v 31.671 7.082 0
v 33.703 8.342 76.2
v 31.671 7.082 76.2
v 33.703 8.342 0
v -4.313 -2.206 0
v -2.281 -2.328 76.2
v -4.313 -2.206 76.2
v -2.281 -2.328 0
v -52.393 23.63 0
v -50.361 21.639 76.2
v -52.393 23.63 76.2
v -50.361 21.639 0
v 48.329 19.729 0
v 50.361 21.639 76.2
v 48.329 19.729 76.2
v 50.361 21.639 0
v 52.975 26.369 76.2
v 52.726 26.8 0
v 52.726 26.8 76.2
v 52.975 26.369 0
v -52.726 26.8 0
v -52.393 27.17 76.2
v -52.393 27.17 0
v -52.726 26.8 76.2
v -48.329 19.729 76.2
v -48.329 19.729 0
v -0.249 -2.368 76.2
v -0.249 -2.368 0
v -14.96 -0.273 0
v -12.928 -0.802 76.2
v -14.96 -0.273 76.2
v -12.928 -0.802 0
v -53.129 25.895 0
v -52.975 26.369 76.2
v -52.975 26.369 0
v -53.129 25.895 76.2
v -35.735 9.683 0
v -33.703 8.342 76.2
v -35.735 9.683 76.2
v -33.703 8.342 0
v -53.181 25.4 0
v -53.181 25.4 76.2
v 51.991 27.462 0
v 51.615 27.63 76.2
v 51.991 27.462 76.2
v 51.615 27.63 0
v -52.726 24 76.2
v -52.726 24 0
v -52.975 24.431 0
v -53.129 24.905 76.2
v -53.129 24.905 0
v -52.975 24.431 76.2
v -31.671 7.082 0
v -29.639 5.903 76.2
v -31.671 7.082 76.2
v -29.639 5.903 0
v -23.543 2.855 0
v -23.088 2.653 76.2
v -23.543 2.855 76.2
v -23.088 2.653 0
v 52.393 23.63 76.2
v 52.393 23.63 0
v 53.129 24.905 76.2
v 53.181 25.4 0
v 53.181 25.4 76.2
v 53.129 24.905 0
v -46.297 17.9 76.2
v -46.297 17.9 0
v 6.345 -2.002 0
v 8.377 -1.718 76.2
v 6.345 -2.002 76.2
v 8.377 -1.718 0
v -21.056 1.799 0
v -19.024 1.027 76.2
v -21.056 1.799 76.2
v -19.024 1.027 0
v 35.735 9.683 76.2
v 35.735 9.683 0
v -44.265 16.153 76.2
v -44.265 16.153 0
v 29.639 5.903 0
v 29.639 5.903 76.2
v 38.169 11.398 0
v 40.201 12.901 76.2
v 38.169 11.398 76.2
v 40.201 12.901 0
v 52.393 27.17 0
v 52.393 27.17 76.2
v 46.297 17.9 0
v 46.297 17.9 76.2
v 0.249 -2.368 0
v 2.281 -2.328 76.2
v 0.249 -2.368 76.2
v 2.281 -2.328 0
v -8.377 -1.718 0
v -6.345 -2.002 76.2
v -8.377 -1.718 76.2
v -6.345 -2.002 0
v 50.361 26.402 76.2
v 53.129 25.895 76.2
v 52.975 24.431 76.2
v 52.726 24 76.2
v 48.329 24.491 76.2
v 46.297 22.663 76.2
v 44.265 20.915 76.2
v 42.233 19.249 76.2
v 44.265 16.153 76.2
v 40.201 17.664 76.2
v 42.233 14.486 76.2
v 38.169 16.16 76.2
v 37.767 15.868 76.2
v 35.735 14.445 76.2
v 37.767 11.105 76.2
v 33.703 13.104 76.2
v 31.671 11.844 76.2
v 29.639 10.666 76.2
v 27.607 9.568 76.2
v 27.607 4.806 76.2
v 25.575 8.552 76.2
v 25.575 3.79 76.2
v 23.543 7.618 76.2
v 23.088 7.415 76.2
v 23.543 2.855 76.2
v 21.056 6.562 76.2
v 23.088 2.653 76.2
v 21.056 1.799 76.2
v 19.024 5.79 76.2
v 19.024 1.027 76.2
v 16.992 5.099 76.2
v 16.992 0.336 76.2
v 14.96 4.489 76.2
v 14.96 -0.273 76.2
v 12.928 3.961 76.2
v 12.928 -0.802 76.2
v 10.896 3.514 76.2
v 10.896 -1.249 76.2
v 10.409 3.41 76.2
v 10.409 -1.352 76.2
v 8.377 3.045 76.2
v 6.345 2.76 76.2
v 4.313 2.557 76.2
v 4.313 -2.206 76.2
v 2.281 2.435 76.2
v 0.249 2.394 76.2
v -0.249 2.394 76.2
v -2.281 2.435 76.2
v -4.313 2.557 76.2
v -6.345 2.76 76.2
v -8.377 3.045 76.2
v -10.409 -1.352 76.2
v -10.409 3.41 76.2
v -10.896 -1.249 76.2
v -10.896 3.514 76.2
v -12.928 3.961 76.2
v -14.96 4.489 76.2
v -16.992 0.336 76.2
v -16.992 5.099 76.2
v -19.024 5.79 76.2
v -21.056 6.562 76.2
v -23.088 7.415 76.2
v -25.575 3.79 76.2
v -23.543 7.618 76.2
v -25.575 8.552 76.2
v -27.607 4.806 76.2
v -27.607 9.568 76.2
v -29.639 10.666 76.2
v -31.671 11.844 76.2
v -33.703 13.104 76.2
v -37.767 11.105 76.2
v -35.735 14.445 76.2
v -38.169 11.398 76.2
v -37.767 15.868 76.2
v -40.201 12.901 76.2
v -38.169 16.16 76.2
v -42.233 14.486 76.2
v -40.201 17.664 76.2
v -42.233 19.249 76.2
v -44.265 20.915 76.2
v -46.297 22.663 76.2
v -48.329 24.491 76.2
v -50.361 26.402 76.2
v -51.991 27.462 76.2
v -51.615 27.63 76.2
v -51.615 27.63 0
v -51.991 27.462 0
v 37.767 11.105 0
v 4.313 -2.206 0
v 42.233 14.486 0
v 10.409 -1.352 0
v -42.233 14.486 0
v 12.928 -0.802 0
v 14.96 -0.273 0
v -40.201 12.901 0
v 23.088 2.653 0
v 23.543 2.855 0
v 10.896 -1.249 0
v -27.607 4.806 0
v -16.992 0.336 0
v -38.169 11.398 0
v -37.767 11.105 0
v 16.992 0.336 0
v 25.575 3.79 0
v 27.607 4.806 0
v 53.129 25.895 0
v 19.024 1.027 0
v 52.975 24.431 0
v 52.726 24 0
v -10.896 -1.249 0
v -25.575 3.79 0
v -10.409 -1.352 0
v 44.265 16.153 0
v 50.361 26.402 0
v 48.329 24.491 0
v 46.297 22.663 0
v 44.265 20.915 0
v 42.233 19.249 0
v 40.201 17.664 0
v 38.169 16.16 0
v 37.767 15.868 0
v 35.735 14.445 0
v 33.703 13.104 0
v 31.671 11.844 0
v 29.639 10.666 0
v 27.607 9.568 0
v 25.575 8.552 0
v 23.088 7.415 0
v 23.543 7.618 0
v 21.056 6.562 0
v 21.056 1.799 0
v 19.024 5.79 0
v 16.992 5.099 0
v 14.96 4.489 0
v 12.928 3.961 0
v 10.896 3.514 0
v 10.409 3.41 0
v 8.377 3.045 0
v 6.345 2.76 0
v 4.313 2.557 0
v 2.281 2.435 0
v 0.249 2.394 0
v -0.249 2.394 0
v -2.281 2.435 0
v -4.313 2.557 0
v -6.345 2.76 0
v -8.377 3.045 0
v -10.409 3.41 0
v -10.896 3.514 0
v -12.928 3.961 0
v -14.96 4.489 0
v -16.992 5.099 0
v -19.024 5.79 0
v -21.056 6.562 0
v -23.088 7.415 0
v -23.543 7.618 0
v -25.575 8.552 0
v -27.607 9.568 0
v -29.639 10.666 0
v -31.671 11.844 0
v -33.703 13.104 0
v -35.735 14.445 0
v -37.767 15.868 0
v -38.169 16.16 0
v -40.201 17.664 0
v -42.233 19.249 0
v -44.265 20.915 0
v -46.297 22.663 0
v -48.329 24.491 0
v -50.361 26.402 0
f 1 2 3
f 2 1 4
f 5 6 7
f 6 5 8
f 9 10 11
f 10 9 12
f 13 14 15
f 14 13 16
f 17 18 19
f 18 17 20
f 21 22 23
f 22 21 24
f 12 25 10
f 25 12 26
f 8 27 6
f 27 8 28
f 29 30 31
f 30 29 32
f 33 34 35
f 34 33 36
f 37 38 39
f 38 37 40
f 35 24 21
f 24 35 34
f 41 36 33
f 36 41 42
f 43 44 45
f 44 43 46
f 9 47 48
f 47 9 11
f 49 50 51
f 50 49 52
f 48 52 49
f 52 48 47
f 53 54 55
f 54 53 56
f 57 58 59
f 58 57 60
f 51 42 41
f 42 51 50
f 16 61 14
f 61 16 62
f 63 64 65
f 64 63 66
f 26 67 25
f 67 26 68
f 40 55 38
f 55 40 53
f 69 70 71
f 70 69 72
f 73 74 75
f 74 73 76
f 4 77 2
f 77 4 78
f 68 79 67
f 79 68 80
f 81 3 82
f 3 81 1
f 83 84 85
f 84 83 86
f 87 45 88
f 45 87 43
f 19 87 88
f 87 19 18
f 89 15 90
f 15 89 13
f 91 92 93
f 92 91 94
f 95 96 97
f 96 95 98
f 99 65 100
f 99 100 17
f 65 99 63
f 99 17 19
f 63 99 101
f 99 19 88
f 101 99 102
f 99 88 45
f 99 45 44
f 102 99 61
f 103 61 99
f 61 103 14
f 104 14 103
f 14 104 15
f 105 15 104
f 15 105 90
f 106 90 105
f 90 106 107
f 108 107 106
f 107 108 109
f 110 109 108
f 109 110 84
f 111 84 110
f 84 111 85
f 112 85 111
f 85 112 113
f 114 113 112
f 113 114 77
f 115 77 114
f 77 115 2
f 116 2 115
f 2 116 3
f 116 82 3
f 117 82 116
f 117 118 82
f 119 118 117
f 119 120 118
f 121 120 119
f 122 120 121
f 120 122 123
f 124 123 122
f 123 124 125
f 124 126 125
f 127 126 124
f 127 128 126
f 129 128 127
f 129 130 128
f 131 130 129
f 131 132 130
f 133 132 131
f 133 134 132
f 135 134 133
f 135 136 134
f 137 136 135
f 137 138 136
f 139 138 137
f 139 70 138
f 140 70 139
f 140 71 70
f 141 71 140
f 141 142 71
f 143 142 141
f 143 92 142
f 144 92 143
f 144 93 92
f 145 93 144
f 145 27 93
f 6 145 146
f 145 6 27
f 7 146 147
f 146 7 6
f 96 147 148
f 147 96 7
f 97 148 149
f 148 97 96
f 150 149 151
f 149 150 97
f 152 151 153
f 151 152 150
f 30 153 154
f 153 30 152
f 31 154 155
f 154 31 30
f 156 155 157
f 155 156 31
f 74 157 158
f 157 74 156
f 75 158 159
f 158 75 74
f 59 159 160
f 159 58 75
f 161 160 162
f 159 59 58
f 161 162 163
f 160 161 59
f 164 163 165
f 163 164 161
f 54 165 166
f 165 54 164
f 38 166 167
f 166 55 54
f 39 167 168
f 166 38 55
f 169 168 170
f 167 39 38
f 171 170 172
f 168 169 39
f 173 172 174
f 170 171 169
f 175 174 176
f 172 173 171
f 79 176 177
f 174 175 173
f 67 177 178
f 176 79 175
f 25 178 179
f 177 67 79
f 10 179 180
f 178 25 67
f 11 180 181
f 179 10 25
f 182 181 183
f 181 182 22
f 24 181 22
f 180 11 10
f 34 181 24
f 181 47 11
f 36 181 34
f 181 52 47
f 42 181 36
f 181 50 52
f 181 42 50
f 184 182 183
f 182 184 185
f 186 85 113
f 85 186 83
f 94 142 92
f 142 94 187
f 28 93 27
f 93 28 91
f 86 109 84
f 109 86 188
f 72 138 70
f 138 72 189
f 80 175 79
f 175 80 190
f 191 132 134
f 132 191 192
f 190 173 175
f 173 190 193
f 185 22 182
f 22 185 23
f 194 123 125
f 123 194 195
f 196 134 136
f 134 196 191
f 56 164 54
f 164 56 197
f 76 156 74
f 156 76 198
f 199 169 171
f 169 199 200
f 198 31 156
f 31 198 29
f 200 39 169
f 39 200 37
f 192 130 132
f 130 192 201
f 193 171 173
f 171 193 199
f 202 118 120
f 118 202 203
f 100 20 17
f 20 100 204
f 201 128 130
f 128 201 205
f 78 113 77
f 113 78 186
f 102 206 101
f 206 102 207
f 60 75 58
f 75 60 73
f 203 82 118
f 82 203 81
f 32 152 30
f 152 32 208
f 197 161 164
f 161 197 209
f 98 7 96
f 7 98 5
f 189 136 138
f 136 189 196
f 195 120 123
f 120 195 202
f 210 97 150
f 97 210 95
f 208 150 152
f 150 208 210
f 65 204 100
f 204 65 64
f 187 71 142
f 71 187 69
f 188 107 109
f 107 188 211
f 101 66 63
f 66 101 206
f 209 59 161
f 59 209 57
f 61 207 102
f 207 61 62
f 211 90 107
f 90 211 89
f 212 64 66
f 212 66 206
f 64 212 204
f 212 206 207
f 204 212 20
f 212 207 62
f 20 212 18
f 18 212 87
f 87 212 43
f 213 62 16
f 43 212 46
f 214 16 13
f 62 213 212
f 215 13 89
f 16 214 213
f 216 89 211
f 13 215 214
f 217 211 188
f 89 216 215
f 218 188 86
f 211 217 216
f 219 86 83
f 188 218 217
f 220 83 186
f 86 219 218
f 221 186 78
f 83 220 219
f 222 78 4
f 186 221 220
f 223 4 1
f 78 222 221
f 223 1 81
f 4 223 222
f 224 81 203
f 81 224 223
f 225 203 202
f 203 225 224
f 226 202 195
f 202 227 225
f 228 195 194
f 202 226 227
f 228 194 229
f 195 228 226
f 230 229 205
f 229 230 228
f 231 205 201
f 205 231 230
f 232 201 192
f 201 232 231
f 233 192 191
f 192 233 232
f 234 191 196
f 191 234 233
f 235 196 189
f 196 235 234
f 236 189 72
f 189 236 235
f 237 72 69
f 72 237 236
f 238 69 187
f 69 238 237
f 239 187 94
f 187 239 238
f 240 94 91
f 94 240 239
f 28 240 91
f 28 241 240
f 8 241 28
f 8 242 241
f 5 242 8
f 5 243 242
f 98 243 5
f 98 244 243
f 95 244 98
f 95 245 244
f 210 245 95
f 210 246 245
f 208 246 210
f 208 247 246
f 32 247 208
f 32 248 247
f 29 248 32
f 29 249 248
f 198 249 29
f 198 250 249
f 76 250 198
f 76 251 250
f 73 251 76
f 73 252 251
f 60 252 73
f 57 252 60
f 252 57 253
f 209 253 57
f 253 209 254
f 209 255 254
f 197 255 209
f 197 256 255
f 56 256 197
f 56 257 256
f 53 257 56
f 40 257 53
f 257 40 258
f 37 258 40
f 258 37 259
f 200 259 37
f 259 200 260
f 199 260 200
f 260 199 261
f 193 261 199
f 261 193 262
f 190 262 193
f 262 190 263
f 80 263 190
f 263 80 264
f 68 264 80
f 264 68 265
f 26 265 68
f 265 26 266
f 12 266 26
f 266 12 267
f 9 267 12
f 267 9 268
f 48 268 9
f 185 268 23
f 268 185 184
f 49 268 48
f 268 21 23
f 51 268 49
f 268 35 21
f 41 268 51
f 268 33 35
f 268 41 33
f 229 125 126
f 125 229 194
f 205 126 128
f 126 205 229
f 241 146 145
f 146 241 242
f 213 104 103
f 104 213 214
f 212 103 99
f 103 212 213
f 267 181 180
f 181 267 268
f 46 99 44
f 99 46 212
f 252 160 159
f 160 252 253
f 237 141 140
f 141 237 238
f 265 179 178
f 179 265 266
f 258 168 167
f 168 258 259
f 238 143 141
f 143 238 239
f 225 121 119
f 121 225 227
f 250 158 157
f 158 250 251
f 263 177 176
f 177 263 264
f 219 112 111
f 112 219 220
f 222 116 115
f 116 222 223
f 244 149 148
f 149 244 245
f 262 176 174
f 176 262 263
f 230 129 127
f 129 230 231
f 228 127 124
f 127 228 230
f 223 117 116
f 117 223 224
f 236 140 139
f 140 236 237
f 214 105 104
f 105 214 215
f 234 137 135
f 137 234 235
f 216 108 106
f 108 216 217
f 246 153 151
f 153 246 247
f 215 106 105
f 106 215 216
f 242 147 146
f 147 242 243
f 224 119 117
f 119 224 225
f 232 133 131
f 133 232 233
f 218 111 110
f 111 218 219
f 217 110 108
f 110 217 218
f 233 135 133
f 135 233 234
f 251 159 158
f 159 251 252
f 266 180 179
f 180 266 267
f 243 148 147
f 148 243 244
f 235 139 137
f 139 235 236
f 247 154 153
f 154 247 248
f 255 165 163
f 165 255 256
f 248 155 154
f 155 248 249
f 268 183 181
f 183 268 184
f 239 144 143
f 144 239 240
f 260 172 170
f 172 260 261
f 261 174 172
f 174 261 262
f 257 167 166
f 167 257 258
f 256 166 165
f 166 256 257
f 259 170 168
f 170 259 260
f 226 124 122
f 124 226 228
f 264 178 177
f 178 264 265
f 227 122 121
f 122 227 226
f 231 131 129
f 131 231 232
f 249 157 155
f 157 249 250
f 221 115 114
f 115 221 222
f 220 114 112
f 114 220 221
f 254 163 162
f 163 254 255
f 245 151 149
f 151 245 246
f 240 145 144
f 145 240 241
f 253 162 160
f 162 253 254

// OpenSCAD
// Created by Andrew Moore 2016
//  For questions, please PM me on Thingiverse
//  www.thingiverse.com/TacPar
//
//  Builds a parabolic plate 
//  according to the formula:
//         y= kx^2
//
//  Where the focal length is 1/(4*k)
//   
//
//  This code is designed for 
//  ease of use, not for computational
//  efficiency. You must be patient 
//  when rendering!
//=============================

//to do: 
//      Add text label for parabola parameters
//      Add base with indicator of focal point

//=============================
//Global Constants: 
//  Don't change these. It will break the code.
//=============================
inch = 25.4;

//=============================
//Compiler Options: 
//These will change your viewing options in OpenSCAD
//=============================
$fn = 30;          

//=============================
//Global Print Variables:
//  These variables will adjust how the part is printed 
//  but not affect the overall part shape
//=============================
numfaces = 50; //this adjusts how smooth the parabolic shape will be

//=============================
//Global Mechanical Variables: 
//  Change these to adjust physical properties of the part
//=============================
Plate_Width = 4*inch;
Plate_Height = 3*inch;
Plate_Thickness = 3/16*inch;
focal_length = 1*inch;


//==============================
//Calculated Variables: 
//Do not Change these directly
//==============================
k=1/(4*focal_length);

module main()
{
    //add global logic and call part modules here
    difference()
    {
        hull()
        {
            parabolic_dish();
        }
        translate([0,Plate_Thickness, -0.01]) scale([1,1,1.1]) hull()
        {
            parabolic_dish();
        }    
    }
        
}

module parabolic_dish()
{
   
   difference()
   {
		positives();
		negatives();
    }    
   module positives()
   {
        for(i=[0:numfaces/2])
        {
            xi = i*Plate_Width/numfaces; 
            yi = k*(xi*xi);
       
            translate([xi,yi,0]) 
                cylinder(r=Plate_Thickness/2, h=Plate_Height);
                
            translate([-xi,yi,0]) 
                cylinder(r=Plate_Thickness/2, h=Plate_Height);
        } 
   }
    module negatives()
   {
       //Use this section to put holes in the part
       //for example: mounting holes, etc.
   }   
}

//execute program and draw the part(s)
main();
